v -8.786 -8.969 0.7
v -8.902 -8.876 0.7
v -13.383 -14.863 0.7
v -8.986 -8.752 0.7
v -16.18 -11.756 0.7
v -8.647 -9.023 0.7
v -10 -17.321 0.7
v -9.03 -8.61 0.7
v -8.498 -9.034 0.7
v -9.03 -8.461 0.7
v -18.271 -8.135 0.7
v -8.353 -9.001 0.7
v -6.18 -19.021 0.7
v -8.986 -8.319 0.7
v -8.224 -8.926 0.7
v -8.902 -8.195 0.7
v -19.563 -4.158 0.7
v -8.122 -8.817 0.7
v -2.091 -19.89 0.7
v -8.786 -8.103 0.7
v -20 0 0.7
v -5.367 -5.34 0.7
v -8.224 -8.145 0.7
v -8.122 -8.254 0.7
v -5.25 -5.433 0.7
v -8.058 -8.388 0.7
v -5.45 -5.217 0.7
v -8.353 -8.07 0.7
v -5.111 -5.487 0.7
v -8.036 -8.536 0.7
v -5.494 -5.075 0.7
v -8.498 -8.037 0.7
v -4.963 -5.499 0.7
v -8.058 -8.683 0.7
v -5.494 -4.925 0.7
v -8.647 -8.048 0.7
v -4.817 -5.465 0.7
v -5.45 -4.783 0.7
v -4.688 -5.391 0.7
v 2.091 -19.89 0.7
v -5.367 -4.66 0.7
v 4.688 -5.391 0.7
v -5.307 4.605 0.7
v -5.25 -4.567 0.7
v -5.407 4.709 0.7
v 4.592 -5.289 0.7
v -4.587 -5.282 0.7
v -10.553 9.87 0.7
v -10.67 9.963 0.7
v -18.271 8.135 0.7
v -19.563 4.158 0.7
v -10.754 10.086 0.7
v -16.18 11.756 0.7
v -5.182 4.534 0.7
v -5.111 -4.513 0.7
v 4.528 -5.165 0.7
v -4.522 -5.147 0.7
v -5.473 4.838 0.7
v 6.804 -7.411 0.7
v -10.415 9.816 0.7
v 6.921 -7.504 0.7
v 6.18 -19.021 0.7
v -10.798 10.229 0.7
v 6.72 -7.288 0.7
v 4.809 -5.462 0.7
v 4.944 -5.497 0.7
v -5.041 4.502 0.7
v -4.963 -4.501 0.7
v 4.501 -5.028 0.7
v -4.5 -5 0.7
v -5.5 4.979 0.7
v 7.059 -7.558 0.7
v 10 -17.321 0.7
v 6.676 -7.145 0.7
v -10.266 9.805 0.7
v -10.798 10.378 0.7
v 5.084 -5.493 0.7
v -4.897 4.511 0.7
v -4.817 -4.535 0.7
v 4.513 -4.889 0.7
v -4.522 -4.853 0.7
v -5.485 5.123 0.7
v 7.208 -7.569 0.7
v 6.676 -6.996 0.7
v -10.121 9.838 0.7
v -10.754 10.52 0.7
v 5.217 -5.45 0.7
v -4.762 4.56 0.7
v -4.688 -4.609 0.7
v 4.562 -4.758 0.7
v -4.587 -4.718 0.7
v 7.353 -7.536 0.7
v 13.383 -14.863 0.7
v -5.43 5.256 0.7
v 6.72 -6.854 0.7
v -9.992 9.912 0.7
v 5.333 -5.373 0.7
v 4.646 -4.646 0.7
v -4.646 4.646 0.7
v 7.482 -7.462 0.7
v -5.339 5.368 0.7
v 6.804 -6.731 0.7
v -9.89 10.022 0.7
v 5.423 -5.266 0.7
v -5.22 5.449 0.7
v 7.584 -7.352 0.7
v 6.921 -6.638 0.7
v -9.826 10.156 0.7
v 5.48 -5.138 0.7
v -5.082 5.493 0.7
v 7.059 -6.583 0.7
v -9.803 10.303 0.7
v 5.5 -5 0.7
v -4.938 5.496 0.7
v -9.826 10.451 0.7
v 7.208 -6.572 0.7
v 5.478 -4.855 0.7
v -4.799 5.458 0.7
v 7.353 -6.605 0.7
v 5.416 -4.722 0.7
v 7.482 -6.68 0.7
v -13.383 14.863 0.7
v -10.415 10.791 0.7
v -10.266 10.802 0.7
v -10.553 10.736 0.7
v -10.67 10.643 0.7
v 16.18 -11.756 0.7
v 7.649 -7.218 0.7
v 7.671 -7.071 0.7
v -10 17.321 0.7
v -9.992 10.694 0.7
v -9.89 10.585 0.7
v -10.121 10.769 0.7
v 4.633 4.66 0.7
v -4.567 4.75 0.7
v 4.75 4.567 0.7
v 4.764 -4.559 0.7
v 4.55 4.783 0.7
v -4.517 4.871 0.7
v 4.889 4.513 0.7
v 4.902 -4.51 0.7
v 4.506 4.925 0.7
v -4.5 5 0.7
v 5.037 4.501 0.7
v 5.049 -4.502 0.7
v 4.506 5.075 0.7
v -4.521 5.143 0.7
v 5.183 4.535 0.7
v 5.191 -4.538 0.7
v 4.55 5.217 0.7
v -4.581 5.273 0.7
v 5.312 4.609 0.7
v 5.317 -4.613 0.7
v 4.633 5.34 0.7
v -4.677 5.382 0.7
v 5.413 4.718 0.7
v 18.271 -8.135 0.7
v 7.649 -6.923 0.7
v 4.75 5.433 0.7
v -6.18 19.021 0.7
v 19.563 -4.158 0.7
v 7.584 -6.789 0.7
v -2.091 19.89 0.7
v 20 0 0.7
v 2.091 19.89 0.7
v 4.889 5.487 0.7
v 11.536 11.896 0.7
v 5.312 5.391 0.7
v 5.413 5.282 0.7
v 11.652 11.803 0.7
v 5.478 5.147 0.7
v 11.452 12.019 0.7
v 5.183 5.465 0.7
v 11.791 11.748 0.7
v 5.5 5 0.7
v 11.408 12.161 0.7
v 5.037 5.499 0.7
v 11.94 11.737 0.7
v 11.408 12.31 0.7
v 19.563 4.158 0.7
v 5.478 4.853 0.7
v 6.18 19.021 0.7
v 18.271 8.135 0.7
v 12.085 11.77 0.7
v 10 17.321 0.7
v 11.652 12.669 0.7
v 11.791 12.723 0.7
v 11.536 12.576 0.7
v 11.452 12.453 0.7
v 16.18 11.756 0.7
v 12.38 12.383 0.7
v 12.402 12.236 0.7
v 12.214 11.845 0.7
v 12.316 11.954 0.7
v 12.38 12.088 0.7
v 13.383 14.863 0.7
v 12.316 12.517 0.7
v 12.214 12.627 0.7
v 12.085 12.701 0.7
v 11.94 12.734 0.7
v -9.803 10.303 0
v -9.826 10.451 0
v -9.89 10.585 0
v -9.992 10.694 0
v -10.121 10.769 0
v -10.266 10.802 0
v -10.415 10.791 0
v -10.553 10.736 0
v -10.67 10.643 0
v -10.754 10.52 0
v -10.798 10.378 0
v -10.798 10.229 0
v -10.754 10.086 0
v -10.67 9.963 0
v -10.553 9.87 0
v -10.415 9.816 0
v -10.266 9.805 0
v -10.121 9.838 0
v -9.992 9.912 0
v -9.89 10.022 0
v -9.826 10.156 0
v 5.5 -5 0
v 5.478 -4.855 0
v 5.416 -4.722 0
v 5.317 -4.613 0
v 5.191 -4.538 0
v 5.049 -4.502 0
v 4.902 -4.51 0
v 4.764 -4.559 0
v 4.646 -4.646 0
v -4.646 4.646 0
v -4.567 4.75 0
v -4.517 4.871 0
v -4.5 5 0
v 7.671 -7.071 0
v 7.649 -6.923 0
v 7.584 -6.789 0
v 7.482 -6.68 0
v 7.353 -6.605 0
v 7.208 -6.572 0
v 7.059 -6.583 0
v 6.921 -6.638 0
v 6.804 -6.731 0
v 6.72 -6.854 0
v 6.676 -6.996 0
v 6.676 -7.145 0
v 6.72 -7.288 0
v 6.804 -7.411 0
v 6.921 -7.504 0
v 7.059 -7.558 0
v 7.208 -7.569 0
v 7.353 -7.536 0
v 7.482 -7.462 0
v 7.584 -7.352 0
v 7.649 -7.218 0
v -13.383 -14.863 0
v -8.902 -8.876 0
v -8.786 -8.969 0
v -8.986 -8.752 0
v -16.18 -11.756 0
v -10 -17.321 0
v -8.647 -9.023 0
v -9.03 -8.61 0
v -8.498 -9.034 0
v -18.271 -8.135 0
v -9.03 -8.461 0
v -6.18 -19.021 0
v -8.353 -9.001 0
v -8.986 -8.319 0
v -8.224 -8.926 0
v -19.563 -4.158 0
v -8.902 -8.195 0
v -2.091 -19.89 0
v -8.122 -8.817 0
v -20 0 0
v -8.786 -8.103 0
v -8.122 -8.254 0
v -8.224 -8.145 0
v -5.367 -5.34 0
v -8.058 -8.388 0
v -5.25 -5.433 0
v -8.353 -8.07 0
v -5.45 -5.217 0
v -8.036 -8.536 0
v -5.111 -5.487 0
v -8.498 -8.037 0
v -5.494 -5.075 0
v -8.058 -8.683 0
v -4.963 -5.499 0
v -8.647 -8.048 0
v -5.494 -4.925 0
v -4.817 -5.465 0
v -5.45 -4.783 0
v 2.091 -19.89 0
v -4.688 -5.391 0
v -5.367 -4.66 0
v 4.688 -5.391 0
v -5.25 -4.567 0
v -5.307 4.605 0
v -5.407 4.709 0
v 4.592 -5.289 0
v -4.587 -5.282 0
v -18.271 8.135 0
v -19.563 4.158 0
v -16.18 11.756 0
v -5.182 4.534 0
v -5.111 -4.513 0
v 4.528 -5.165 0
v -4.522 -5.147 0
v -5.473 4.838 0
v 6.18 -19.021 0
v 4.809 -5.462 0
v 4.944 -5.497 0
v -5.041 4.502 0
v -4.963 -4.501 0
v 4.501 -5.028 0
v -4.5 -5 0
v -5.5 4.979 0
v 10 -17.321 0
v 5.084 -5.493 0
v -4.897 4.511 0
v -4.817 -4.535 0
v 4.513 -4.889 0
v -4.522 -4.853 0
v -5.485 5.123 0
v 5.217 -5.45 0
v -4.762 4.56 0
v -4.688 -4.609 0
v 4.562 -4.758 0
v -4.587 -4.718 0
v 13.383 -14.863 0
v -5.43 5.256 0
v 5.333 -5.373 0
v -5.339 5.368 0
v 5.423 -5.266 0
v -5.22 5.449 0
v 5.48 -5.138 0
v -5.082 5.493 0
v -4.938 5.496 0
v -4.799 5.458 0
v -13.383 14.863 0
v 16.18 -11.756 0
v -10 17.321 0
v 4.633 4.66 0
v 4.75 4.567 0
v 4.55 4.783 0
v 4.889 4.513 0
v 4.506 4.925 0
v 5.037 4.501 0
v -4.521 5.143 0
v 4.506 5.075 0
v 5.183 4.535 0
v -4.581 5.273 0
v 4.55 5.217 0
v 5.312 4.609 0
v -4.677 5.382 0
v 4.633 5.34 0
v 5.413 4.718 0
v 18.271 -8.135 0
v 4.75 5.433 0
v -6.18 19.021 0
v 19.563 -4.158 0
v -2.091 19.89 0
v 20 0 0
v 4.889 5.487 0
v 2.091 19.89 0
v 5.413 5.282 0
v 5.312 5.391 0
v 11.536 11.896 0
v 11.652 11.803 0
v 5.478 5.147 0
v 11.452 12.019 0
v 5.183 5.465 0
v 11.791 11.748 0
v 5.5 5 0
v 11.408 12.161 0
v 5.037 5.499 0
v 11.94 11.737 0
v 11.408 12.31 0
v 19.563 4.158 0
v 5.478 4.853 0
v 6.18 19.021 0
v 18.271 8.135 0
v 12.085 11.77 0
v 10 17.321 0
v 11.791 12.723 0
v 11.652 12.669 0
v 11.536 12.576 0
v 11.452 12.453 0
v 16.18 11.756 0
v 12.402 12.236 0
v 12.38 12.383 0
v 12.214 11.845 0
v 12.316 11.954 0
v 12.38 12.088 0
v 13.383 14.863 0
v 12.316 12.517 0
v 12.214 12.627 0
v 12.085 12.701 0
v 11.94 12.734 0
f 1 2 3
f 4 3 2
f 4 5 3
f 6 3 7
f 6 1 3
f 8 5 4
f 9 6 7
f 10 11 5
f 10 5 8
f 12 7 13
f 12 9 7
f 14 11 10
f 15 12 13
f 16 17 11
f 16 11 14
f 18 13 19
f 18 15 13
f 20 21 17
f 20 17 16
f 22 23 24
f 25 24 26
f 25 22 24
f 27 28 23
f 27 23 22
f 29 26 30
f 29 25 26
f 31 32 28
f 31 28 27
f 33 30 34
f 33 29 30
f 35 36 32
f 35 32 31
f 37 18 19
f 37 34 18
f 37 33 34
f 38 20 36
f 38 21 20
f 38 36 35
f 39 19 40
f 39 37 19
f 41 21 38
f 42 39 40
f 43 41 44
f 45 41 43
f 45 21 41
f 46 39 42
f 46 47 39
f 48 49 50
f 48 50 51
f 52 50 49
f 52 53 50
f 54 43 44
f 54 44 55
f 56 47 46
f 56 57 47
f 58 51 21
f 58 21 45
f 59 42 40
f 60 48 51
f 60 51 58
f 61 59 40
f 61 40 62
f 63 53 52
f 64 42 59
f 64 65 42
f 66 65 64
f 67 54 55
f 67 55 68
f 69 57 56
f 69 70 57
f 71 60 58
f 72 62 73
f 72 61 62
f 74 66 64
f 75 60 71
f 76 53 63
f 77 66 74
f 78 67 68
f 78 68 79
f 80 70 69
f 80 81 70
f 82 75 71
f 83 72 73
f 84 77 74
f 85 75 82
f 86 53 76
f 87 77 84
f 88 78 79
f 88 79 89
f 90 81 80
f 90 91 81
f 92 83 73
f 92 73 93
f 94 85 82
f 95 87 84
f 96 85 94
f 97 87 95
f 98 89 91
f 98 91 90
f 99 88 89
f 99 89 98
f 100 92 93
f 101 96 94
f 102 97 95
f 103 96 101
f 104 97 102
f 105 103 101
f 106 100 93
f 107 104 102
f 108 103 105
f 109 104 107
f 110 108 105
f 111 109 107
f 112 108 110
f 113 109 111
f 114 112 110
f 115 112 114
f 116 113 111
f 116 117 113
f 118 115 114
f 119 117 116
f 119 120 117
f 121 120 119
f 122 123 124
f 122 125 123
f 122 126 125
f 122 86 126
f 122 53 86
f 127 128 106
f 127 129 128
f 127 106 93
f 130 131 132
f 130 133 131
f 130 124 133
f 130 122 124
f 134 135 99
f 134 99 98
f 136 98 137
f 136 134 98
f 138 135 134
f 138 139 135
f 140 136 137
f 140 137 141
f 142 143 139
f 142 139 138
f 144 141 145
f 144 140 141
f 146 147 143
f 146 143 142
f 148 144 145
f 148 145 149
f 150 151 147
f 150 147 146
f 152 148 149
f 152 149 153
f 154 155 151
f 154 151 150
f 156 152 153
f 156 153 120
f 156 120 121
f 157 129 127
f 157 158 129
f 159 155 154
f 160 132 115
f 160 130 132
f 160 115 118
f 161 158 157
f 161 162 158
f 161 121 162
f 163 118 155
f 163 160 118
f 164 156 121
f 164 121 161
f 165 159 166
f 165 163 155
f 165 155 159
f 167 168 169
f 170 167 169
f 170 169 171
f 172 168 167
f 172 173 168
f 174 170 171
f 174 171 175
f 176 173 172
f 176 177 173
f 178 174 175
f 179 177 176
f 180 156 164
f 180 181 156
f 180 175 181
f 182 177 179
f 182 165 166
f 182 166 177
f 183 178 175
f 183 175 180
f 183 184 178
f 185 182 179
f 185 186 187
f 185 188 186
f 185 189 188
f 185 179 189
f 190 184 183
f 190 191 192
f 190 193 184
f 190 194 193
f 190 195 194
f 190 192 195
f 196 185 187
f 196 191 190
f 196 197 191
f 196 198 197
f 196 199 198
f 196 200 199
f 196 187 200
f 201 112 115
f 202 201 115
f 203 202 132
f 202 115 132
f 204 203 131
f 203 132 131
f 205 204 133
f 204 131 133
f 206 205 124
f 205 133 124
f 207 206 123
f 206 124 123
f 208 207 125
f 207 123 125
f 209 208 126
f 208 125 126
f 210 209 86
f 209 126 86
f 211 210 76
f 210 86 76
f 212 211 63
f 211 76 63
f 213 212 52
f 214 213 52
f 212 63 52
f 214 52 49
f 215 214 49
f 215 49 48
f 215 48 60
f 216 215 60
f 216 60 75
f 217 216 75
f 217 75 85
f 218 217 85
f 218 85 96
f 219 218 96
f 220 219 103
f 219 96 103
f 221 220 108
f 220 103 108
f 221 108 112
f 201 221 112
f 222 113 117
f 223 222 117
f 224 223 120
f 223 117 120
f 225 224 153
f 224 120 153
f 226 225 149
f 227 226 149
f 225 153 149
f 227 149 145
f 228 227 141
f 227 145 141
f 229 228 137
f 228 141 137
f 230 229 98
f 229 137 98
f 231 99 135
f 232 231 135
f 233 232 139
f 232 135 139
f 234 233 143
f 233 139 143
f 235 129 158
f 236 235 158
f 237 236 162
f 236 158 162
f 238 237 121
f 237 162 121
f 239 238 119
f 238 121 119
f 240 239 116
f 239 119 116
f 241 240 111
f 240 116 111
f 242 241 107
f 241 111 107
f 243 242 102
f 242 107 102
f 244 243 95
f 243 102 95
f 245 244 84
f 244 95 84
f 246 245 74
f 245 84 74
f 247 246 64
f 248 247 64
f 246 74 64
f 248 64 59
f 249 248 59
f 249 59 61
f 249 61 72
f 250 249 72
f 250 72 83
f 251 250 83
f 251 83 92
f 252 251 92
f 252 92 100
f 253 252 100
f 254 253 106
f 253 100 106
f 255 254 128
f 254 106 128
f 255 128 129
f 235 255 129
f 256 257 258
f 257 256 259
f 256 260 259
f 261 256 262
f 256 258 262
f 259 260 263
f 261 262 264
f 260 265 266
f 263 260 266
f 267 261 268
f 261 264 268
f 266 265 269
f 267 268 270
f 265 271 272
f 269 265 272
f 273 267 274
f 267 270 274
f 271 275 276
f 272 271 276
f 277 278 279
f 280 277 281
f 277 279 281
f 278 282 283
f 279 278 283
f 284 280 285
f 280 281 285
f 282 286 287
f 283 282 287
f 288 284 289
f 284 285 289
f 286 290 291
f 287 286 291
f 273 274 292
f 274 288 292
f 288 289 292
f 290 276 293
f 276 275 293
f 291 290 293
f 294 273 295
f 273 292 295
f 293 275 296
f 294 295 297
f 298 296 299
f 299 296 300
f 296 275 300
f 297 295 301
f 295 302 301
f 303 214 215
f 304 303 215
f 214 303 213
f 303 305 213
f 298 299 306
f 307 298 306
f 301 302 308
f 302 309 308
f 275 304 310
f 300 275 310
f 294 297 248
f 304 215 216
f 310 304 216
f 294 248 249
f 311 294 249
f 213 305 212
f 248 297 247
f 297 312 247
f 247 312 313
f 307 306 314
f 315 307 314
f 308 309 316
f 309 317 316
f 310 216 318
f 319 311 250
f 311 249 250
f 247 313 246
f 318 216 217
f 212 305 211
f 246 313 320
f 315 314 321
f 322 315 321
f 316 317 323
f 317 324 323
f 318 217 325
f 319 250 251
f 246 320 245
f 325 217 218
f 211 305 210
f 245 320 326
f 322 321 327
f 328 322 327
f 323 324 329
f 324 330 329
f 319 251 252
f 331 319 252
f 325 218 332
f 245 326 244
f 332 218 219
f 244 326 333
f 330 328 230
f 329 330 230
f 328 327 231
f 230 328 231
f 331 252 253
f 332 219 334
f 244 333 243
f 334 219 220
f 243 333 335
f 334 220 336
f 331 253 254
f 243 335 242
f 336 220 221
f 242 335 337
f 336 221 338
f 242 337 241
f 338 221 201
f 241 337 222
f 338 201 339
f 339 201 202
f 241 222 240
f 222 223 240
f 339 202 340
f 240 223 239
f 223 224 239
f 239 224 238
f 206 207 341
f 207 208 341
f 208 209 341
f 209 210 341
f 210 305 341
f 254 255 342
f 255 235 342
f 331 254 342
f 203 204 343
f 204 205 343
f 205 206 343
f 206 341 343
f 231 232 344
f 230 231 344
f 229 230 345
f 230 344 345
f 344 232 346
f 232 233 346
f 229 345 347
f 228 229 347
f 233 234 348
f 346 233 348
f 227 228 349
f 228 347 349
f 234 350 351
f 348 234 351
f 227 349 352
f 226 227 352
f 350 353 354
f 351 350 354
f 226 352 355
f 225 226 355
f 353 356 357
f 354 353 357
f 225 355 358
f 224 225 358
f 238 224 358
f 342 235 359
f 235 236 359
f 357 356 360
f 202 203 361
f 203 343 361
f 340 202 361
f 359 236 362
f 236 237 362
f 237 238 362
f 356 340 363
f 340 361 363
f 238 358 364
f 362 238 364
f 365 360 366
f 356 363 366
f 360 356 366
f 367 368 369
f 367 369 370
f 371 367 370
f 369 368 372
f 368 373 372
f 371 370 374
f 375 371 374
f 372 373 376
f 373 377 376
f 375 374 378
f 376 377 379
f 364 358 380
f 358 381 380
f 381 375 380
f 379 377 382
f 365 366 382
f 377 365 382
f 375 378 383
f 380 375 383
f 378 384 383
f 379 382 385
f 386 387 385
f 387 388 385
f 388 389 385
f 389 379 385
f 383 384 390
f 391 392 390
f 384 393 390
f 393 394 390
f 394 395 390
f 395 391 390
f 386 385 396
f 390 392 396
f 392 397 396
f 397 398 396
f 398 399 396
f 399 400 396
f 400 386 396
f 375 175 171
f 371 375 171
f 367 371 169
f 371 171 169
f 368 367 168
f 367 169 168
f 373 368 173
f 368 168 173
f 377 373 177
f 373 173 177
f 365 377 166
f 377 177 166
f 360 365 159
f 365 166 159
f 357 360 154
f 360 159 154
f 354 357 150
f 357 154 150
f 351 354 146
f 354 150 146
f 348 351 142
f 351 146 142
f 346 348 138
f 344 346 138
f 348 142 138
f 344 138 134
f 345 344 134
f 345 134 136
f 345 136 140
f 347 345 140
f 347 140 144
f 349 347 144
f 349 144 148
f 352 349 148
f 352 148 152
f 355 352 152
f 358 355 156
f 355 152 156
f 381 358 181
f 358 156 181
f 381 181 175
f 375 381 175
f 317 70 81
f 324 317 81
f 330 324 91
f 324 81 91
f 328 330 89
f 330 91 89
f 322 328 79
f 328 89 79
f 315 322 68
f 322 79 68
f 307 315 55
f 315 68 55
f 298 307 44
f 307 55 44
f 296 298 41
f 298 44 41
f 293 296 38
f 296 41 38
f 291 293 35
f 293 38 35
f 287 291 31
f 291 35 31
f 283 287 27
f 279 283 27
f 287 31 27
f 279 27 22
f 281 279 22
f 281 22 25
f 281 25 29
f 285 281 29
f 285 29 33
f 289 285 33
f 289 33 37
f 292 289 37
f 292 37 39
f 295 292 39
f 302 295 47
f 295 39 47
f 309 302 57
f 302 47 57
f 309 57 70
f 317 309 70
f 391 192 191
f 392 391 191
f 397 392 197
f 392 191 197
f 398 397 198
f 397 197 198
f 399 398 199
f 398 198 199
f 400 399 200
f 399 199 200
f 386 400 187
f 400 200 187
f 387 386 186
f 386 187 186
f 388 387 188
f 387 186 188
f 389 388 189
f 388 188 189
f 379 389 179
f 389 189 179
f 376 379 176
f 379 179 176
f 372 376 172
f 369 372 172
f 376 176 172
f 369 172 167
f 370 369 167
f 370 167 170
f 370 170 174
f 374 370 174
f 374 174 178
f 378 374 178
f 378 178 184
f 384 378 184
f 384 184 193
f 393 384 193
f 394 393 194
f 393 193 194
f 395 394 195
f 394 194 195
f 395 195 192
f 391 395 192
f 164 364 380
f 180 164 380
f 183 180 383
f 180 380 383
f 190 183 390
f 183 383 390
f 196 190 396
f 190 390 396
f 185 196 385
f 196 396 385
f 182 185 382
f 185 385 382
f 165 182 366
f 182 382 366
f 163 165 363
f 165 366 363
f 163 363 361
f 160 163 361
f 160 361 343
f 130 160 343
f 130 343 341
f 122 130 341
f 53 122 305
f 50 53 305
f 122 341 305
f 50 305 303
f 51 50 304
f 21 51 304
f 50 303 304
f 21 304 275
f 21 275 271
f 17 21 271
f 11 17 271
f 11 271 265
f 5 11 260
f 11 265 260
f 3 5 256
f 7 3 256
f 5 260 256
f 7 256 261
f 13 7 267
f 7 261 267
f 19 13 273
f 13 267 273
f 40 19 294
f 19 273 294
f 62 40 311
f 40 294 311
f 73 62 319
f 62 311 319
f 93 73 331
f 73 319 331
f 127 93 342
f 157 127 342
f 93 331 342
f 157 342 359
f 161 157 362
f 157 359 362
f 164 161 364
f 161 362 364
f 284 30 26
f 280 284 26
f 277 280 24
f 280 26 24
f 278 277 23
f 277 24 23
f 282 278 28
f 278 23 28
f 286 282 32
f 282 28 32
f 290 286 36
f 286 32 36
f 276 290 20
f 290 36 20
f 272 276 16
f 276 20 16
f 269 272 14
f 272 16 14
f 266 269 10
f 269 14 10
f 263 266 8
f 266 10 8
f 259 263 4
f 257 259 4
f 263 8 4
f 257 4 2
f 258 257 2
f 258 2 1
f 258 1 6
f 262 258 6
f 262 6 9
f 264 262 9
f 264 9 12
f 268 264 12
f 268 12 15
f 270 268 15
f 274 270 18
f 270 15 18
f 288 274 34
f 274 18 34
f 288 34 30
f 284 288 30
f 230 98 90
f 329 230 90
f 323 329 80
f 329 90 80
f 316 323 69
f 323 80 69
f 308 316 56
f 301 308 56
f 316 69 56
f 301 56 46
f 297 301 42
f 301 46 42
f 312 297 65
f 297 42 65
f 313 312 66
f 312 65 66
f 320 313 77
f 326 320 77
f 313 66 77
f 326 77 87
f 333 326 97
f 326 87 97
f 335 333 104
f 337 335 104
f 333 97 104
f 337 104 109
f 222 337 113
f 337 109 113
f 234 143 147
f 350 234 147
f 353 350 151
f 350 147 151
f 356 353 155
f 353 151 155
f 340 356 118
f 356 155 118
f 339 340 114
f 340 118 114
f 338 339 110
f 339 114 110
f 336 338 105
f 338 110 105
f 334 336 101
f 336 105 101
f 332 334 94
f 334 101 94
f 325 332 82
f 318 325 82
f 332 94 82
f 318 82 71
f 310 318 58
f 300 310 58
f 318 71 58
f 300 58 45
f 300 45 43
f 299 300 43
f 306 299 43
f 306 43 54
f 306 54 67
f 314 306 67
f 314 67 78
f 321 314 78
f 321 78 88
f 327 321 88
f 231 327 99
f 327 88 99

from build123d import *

# Parameters (mm, degrees)
F0_R     = 20
F1_DEPTH = 0.7
F2_R     = 0.5
F3_DEPTH = 0.7


with BuildPart() as f1:
    # F0 (on Top) → F1 (new body)
    with BuildSketch(Plane.XY):
        Circle(F0_R)
    extrude(amount=F1_DEPTH)

    # F2 (on face) → F3 (cut)
    with BuildSketch(Plane.XY.offset(0.7)):
        with BuildLine():
            ThreePointArc((-4.646434, 4.646434), (-4.538048, 4.808646), (-4.499987, 4.999987))
            ThreePointArc((-4.499987, 4.999987), (-5.461927, 5.191329), (-4.646434, 4.646434))
        make_face()
        with BuildLine():
            ThreePointArc((5.499987, -4.999987), (5.191329, -4.538048), (4.646434, -4.646434))
            ThreePointArc((4.646434, -4.646434), (4.808646, -5.461927), (5.499987, -4.999987))
        make_face()
        with Locations((5.000013, 5.000013)):
            Circle(F2_R)
        with Locations((-5.000013, -5.000013)):
            Circle(F2_R)
        with Locations((-10.303288, 10.303288)):
            Circle(F2_R)
        with Locations((-8.535547, -8.535547)):
            Circle(F2_R)
        with Locations((7.170718, -7.070718)):
            Circle(F2_R)
        with Locations((11.902449, 12.235783)):
            Circle(F2_R)
    extrude(amount=-F3_DEPTH, mode=Mode.SUBTRACT)


solid = f1.part
